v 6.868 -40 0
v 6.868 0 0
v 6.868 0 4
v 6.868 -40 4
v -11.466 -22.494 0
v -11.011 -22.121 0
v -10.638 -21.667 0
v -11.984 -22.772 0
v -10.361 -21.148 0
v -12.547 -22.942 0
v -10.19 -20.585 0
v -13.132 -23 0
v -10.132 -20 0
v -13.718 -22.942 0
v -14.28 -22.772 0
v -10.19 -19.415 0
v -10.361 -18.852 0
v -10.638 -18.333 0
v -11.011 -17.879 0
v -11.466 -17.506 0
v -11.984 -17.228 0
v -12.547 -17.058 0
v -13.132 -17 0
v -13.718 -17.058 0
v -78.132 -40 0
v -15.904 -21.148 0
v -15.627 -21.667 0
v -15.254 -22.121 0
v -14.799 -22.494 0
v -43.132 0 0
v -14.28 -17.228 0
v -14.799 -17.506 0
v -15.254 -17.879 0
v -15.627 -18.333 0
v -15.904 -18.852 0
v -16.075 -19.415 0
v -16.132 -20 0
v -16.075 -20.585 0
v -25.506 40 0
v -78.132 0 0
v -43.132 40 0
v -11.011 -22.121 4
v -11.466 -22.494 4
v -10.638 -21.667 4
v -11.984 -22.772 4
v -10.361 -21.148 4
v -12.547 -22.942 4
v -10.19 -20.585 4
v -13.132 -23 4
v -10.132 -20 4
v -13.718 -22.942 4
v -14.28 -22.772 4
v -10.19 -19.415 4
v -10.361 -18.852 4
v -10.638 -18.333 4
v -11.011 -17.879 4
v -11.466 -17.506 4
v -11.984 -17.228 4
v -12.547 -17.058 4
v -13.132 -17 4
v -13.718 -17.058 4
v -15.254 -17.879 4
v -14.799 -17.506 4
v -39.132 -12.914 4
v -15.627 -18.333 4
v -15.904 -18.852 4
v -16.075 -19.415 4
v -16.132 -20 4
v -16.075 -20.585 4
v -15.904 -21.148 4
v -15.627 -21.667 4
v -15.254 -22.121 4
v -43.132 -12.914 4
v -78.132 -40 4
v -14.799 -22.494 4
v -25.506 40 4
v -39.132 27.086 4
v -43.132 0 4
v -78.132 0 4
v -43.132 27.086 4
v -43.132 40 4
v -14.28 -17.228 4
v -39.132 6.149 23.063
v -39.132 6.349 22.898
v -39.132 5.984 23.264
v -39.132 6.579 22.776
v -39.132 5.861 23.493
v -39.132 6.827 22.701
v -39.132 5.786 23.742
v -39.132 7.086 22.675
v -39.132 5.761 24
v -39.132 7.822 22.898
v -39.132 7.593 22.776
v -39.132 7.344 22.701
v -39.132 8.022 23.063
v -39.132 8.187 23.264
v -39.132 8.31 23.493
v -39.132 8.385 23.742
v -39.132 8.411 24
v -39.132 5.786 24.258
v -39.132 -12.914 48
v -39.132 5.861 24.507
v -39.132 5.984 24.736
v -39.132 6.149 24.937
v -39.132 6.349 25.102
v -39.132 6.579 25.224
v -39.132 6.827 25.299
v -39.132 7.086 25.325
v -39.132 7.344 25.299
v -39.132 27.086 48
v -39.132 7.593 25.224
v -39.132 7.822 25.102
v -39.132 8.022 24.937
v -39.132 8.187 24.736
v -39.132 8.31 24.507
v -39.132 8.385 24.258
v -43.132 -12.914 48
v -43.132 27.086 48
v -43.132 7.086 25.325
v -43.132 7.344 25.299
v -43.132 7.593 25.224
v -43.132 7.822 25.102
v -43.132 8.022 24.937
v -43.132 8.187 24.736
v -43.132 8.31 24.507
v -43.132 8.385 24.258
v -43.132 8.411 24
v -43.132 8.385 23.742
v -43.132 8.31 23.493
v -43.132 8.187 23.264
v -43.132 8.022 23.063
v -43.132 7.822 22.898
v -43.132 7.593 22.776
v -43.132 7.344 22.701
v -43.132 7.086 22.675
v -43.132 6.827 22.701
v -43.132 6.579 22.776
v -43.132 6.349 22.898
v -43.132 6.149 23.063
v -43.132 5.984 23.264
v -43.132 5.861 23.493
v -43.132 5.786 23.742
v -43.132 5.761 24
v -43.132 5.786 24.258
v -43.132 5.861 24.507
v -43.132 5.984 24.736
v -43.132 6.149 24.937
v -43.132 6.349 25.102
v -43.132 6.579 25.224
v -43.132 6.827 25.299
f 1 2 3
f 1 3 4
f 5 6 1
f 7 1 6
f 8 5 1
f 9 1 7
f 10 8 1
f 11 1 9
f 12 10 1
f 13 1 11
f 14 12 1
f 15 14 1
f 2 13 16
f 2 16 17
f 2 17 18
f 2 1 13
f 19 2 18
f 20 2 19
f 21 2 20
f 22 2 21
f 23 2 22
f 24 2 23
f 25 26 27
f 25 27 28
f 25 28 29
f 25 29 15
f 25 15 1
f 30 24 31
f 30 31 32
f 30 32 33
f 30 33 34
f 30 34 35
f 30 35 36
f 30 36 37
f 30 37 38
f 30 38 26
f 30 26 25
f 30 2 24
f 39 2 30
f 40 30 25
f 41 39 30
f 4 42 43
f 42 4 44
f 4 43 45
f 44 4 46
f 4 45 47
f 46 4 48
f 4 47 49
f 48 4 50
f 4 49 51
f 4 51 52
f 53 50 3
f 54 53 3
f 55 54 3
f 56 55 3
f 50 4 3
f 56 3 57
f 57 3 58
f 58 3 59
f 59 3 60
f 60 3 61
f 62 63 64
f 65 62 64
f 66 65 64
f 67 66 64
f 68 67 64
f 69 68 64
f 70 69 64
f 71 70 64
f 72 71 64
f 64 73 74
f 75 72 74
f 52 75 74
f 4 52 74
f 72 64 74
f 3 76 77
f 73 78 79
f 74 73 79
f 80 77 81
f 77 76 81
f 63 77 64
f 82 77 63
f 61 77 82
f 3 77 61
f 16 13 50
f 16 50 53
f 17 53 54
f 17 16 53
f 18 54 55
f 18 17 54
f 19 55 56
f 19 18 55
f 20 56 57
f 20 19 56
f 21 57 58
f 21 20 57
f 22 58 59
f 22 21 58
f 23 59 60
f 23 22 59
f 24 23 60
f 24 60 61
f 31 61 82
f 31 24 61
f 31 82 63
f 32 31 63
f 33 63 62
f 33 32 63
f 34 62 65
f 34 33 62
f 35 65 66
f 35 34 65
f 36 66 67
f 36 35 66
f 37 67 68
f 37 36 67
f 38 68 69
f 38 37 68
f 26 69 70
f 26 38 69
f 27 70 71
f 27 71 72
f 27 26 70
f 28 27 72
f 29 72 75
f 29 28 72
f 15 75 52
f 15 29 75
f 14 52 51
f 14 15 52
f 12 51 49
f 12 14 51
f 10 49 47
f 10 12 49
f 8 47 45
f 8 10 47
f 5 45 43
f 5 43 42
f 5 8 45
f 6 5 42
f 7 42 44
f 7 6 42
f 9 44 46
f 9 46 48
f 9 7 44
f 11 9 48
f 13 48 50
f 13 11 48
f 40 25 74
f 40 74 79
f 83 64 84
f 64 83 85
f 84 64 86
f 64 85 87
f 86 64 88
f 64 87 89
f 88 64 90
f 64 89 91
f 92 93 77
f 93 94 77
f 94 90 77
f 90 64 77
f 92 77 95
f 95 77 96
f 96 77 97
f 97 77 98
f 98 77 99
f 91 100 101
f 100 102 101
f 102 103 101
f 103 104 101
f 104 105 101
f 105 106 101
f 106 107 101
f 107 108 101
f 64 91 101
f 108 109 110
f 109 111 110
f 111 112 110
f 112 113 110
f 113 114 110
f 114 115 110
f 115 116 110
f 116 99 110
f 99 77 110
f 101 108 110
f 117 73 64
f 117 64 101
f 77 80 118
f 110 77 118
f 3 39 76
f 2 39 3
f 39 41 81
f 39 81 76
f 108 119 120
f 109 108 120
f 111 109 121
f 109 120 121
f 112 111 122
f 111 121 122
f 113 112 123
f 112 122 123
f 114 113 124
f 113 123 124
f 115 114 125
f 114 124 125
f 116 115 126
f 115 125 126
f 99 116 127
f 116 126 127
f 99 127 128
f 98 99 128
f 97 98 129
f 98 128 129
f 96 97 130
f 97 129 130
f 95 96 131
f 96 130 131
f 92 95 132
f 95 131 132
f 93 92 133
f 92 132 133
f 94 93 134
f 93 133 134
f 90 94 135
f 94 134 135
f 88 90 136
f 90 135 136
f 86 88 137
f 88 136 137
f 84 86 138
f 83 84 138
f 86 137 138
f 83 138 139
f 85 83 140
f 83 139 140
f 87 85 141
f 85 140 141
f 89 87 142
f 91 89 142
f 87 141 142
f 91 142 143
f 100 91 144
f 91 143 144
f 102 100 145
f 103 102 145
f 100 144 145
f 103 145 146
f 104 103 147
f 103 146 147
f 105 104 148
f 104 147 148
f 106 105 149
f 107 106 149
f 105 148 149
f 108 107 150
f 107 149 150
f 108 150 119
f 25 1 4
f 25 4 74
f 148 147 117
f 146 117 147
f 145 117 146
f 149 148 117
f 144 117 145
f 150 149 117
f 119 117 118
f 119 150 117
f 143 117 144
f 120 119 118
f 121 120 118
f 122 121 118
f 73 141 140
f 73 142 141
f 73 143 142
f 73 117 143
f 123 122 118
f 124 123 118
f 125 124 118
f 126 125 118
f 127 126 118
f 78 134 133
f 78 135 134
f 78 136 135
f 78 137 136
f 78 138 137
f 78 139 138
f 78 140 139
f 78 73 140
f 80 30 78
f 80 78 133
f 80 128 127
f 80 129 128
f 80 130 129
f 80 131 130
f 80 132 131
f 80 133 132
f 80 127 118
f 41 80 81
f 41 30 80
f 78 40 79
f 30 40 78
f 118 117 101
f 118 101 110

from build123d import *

# Parameters (mm, degrees)
SKIZZE1_R                       = 3
AUFSATZ_LINEAR_AUSTRAGEN1_DEPTH = 4
SKIZZE3_W                       = 48
SKIZZE3_H                       = 40
SKIZZE3_R                       = 1.324941068
AUFSATZ_LINEAR_AUSTRAGEN2_DEPTH = 4


with BuildPart() as part:
    # Skizze1 → Aufsatz-Linear austragen1 (new body)
    with BuildSketch(Plane.XY):
        Polygon((-78.13229572, 0), (-43.13229572, 0), (-43.13229572, 40), (-25.505836576, 40), (6.86770428, 0), (6.86770428, -40), (-78.13229572, -40), align=None)
        with Locations((-13.13229572, -20)):
            Circle(SKIZZE1_R, mode=Mode.SUBTRACT)
    extrude(amount=AUFSATZ_LINEAR_AUSTRAGEN1_DEPTH)

    # Skizze3 → Aufsatz-Linear austragen2 (add)
    with BuildSketch(Plane.ZY.offset(43.13229572)):
        with Locations((24, 7.085584289)):
            Rectangle(SKIZZE3_W, SKIZZE3_H)
        with Locations((24, 7.085584289)):
            Circle(SKIZZE3_R, mode=Mode.SUBTRACT)
    extrude(amount=-AUFSATZ_LINEAR_AUSTRAGEN2_DEPTH)


solid = part.part
